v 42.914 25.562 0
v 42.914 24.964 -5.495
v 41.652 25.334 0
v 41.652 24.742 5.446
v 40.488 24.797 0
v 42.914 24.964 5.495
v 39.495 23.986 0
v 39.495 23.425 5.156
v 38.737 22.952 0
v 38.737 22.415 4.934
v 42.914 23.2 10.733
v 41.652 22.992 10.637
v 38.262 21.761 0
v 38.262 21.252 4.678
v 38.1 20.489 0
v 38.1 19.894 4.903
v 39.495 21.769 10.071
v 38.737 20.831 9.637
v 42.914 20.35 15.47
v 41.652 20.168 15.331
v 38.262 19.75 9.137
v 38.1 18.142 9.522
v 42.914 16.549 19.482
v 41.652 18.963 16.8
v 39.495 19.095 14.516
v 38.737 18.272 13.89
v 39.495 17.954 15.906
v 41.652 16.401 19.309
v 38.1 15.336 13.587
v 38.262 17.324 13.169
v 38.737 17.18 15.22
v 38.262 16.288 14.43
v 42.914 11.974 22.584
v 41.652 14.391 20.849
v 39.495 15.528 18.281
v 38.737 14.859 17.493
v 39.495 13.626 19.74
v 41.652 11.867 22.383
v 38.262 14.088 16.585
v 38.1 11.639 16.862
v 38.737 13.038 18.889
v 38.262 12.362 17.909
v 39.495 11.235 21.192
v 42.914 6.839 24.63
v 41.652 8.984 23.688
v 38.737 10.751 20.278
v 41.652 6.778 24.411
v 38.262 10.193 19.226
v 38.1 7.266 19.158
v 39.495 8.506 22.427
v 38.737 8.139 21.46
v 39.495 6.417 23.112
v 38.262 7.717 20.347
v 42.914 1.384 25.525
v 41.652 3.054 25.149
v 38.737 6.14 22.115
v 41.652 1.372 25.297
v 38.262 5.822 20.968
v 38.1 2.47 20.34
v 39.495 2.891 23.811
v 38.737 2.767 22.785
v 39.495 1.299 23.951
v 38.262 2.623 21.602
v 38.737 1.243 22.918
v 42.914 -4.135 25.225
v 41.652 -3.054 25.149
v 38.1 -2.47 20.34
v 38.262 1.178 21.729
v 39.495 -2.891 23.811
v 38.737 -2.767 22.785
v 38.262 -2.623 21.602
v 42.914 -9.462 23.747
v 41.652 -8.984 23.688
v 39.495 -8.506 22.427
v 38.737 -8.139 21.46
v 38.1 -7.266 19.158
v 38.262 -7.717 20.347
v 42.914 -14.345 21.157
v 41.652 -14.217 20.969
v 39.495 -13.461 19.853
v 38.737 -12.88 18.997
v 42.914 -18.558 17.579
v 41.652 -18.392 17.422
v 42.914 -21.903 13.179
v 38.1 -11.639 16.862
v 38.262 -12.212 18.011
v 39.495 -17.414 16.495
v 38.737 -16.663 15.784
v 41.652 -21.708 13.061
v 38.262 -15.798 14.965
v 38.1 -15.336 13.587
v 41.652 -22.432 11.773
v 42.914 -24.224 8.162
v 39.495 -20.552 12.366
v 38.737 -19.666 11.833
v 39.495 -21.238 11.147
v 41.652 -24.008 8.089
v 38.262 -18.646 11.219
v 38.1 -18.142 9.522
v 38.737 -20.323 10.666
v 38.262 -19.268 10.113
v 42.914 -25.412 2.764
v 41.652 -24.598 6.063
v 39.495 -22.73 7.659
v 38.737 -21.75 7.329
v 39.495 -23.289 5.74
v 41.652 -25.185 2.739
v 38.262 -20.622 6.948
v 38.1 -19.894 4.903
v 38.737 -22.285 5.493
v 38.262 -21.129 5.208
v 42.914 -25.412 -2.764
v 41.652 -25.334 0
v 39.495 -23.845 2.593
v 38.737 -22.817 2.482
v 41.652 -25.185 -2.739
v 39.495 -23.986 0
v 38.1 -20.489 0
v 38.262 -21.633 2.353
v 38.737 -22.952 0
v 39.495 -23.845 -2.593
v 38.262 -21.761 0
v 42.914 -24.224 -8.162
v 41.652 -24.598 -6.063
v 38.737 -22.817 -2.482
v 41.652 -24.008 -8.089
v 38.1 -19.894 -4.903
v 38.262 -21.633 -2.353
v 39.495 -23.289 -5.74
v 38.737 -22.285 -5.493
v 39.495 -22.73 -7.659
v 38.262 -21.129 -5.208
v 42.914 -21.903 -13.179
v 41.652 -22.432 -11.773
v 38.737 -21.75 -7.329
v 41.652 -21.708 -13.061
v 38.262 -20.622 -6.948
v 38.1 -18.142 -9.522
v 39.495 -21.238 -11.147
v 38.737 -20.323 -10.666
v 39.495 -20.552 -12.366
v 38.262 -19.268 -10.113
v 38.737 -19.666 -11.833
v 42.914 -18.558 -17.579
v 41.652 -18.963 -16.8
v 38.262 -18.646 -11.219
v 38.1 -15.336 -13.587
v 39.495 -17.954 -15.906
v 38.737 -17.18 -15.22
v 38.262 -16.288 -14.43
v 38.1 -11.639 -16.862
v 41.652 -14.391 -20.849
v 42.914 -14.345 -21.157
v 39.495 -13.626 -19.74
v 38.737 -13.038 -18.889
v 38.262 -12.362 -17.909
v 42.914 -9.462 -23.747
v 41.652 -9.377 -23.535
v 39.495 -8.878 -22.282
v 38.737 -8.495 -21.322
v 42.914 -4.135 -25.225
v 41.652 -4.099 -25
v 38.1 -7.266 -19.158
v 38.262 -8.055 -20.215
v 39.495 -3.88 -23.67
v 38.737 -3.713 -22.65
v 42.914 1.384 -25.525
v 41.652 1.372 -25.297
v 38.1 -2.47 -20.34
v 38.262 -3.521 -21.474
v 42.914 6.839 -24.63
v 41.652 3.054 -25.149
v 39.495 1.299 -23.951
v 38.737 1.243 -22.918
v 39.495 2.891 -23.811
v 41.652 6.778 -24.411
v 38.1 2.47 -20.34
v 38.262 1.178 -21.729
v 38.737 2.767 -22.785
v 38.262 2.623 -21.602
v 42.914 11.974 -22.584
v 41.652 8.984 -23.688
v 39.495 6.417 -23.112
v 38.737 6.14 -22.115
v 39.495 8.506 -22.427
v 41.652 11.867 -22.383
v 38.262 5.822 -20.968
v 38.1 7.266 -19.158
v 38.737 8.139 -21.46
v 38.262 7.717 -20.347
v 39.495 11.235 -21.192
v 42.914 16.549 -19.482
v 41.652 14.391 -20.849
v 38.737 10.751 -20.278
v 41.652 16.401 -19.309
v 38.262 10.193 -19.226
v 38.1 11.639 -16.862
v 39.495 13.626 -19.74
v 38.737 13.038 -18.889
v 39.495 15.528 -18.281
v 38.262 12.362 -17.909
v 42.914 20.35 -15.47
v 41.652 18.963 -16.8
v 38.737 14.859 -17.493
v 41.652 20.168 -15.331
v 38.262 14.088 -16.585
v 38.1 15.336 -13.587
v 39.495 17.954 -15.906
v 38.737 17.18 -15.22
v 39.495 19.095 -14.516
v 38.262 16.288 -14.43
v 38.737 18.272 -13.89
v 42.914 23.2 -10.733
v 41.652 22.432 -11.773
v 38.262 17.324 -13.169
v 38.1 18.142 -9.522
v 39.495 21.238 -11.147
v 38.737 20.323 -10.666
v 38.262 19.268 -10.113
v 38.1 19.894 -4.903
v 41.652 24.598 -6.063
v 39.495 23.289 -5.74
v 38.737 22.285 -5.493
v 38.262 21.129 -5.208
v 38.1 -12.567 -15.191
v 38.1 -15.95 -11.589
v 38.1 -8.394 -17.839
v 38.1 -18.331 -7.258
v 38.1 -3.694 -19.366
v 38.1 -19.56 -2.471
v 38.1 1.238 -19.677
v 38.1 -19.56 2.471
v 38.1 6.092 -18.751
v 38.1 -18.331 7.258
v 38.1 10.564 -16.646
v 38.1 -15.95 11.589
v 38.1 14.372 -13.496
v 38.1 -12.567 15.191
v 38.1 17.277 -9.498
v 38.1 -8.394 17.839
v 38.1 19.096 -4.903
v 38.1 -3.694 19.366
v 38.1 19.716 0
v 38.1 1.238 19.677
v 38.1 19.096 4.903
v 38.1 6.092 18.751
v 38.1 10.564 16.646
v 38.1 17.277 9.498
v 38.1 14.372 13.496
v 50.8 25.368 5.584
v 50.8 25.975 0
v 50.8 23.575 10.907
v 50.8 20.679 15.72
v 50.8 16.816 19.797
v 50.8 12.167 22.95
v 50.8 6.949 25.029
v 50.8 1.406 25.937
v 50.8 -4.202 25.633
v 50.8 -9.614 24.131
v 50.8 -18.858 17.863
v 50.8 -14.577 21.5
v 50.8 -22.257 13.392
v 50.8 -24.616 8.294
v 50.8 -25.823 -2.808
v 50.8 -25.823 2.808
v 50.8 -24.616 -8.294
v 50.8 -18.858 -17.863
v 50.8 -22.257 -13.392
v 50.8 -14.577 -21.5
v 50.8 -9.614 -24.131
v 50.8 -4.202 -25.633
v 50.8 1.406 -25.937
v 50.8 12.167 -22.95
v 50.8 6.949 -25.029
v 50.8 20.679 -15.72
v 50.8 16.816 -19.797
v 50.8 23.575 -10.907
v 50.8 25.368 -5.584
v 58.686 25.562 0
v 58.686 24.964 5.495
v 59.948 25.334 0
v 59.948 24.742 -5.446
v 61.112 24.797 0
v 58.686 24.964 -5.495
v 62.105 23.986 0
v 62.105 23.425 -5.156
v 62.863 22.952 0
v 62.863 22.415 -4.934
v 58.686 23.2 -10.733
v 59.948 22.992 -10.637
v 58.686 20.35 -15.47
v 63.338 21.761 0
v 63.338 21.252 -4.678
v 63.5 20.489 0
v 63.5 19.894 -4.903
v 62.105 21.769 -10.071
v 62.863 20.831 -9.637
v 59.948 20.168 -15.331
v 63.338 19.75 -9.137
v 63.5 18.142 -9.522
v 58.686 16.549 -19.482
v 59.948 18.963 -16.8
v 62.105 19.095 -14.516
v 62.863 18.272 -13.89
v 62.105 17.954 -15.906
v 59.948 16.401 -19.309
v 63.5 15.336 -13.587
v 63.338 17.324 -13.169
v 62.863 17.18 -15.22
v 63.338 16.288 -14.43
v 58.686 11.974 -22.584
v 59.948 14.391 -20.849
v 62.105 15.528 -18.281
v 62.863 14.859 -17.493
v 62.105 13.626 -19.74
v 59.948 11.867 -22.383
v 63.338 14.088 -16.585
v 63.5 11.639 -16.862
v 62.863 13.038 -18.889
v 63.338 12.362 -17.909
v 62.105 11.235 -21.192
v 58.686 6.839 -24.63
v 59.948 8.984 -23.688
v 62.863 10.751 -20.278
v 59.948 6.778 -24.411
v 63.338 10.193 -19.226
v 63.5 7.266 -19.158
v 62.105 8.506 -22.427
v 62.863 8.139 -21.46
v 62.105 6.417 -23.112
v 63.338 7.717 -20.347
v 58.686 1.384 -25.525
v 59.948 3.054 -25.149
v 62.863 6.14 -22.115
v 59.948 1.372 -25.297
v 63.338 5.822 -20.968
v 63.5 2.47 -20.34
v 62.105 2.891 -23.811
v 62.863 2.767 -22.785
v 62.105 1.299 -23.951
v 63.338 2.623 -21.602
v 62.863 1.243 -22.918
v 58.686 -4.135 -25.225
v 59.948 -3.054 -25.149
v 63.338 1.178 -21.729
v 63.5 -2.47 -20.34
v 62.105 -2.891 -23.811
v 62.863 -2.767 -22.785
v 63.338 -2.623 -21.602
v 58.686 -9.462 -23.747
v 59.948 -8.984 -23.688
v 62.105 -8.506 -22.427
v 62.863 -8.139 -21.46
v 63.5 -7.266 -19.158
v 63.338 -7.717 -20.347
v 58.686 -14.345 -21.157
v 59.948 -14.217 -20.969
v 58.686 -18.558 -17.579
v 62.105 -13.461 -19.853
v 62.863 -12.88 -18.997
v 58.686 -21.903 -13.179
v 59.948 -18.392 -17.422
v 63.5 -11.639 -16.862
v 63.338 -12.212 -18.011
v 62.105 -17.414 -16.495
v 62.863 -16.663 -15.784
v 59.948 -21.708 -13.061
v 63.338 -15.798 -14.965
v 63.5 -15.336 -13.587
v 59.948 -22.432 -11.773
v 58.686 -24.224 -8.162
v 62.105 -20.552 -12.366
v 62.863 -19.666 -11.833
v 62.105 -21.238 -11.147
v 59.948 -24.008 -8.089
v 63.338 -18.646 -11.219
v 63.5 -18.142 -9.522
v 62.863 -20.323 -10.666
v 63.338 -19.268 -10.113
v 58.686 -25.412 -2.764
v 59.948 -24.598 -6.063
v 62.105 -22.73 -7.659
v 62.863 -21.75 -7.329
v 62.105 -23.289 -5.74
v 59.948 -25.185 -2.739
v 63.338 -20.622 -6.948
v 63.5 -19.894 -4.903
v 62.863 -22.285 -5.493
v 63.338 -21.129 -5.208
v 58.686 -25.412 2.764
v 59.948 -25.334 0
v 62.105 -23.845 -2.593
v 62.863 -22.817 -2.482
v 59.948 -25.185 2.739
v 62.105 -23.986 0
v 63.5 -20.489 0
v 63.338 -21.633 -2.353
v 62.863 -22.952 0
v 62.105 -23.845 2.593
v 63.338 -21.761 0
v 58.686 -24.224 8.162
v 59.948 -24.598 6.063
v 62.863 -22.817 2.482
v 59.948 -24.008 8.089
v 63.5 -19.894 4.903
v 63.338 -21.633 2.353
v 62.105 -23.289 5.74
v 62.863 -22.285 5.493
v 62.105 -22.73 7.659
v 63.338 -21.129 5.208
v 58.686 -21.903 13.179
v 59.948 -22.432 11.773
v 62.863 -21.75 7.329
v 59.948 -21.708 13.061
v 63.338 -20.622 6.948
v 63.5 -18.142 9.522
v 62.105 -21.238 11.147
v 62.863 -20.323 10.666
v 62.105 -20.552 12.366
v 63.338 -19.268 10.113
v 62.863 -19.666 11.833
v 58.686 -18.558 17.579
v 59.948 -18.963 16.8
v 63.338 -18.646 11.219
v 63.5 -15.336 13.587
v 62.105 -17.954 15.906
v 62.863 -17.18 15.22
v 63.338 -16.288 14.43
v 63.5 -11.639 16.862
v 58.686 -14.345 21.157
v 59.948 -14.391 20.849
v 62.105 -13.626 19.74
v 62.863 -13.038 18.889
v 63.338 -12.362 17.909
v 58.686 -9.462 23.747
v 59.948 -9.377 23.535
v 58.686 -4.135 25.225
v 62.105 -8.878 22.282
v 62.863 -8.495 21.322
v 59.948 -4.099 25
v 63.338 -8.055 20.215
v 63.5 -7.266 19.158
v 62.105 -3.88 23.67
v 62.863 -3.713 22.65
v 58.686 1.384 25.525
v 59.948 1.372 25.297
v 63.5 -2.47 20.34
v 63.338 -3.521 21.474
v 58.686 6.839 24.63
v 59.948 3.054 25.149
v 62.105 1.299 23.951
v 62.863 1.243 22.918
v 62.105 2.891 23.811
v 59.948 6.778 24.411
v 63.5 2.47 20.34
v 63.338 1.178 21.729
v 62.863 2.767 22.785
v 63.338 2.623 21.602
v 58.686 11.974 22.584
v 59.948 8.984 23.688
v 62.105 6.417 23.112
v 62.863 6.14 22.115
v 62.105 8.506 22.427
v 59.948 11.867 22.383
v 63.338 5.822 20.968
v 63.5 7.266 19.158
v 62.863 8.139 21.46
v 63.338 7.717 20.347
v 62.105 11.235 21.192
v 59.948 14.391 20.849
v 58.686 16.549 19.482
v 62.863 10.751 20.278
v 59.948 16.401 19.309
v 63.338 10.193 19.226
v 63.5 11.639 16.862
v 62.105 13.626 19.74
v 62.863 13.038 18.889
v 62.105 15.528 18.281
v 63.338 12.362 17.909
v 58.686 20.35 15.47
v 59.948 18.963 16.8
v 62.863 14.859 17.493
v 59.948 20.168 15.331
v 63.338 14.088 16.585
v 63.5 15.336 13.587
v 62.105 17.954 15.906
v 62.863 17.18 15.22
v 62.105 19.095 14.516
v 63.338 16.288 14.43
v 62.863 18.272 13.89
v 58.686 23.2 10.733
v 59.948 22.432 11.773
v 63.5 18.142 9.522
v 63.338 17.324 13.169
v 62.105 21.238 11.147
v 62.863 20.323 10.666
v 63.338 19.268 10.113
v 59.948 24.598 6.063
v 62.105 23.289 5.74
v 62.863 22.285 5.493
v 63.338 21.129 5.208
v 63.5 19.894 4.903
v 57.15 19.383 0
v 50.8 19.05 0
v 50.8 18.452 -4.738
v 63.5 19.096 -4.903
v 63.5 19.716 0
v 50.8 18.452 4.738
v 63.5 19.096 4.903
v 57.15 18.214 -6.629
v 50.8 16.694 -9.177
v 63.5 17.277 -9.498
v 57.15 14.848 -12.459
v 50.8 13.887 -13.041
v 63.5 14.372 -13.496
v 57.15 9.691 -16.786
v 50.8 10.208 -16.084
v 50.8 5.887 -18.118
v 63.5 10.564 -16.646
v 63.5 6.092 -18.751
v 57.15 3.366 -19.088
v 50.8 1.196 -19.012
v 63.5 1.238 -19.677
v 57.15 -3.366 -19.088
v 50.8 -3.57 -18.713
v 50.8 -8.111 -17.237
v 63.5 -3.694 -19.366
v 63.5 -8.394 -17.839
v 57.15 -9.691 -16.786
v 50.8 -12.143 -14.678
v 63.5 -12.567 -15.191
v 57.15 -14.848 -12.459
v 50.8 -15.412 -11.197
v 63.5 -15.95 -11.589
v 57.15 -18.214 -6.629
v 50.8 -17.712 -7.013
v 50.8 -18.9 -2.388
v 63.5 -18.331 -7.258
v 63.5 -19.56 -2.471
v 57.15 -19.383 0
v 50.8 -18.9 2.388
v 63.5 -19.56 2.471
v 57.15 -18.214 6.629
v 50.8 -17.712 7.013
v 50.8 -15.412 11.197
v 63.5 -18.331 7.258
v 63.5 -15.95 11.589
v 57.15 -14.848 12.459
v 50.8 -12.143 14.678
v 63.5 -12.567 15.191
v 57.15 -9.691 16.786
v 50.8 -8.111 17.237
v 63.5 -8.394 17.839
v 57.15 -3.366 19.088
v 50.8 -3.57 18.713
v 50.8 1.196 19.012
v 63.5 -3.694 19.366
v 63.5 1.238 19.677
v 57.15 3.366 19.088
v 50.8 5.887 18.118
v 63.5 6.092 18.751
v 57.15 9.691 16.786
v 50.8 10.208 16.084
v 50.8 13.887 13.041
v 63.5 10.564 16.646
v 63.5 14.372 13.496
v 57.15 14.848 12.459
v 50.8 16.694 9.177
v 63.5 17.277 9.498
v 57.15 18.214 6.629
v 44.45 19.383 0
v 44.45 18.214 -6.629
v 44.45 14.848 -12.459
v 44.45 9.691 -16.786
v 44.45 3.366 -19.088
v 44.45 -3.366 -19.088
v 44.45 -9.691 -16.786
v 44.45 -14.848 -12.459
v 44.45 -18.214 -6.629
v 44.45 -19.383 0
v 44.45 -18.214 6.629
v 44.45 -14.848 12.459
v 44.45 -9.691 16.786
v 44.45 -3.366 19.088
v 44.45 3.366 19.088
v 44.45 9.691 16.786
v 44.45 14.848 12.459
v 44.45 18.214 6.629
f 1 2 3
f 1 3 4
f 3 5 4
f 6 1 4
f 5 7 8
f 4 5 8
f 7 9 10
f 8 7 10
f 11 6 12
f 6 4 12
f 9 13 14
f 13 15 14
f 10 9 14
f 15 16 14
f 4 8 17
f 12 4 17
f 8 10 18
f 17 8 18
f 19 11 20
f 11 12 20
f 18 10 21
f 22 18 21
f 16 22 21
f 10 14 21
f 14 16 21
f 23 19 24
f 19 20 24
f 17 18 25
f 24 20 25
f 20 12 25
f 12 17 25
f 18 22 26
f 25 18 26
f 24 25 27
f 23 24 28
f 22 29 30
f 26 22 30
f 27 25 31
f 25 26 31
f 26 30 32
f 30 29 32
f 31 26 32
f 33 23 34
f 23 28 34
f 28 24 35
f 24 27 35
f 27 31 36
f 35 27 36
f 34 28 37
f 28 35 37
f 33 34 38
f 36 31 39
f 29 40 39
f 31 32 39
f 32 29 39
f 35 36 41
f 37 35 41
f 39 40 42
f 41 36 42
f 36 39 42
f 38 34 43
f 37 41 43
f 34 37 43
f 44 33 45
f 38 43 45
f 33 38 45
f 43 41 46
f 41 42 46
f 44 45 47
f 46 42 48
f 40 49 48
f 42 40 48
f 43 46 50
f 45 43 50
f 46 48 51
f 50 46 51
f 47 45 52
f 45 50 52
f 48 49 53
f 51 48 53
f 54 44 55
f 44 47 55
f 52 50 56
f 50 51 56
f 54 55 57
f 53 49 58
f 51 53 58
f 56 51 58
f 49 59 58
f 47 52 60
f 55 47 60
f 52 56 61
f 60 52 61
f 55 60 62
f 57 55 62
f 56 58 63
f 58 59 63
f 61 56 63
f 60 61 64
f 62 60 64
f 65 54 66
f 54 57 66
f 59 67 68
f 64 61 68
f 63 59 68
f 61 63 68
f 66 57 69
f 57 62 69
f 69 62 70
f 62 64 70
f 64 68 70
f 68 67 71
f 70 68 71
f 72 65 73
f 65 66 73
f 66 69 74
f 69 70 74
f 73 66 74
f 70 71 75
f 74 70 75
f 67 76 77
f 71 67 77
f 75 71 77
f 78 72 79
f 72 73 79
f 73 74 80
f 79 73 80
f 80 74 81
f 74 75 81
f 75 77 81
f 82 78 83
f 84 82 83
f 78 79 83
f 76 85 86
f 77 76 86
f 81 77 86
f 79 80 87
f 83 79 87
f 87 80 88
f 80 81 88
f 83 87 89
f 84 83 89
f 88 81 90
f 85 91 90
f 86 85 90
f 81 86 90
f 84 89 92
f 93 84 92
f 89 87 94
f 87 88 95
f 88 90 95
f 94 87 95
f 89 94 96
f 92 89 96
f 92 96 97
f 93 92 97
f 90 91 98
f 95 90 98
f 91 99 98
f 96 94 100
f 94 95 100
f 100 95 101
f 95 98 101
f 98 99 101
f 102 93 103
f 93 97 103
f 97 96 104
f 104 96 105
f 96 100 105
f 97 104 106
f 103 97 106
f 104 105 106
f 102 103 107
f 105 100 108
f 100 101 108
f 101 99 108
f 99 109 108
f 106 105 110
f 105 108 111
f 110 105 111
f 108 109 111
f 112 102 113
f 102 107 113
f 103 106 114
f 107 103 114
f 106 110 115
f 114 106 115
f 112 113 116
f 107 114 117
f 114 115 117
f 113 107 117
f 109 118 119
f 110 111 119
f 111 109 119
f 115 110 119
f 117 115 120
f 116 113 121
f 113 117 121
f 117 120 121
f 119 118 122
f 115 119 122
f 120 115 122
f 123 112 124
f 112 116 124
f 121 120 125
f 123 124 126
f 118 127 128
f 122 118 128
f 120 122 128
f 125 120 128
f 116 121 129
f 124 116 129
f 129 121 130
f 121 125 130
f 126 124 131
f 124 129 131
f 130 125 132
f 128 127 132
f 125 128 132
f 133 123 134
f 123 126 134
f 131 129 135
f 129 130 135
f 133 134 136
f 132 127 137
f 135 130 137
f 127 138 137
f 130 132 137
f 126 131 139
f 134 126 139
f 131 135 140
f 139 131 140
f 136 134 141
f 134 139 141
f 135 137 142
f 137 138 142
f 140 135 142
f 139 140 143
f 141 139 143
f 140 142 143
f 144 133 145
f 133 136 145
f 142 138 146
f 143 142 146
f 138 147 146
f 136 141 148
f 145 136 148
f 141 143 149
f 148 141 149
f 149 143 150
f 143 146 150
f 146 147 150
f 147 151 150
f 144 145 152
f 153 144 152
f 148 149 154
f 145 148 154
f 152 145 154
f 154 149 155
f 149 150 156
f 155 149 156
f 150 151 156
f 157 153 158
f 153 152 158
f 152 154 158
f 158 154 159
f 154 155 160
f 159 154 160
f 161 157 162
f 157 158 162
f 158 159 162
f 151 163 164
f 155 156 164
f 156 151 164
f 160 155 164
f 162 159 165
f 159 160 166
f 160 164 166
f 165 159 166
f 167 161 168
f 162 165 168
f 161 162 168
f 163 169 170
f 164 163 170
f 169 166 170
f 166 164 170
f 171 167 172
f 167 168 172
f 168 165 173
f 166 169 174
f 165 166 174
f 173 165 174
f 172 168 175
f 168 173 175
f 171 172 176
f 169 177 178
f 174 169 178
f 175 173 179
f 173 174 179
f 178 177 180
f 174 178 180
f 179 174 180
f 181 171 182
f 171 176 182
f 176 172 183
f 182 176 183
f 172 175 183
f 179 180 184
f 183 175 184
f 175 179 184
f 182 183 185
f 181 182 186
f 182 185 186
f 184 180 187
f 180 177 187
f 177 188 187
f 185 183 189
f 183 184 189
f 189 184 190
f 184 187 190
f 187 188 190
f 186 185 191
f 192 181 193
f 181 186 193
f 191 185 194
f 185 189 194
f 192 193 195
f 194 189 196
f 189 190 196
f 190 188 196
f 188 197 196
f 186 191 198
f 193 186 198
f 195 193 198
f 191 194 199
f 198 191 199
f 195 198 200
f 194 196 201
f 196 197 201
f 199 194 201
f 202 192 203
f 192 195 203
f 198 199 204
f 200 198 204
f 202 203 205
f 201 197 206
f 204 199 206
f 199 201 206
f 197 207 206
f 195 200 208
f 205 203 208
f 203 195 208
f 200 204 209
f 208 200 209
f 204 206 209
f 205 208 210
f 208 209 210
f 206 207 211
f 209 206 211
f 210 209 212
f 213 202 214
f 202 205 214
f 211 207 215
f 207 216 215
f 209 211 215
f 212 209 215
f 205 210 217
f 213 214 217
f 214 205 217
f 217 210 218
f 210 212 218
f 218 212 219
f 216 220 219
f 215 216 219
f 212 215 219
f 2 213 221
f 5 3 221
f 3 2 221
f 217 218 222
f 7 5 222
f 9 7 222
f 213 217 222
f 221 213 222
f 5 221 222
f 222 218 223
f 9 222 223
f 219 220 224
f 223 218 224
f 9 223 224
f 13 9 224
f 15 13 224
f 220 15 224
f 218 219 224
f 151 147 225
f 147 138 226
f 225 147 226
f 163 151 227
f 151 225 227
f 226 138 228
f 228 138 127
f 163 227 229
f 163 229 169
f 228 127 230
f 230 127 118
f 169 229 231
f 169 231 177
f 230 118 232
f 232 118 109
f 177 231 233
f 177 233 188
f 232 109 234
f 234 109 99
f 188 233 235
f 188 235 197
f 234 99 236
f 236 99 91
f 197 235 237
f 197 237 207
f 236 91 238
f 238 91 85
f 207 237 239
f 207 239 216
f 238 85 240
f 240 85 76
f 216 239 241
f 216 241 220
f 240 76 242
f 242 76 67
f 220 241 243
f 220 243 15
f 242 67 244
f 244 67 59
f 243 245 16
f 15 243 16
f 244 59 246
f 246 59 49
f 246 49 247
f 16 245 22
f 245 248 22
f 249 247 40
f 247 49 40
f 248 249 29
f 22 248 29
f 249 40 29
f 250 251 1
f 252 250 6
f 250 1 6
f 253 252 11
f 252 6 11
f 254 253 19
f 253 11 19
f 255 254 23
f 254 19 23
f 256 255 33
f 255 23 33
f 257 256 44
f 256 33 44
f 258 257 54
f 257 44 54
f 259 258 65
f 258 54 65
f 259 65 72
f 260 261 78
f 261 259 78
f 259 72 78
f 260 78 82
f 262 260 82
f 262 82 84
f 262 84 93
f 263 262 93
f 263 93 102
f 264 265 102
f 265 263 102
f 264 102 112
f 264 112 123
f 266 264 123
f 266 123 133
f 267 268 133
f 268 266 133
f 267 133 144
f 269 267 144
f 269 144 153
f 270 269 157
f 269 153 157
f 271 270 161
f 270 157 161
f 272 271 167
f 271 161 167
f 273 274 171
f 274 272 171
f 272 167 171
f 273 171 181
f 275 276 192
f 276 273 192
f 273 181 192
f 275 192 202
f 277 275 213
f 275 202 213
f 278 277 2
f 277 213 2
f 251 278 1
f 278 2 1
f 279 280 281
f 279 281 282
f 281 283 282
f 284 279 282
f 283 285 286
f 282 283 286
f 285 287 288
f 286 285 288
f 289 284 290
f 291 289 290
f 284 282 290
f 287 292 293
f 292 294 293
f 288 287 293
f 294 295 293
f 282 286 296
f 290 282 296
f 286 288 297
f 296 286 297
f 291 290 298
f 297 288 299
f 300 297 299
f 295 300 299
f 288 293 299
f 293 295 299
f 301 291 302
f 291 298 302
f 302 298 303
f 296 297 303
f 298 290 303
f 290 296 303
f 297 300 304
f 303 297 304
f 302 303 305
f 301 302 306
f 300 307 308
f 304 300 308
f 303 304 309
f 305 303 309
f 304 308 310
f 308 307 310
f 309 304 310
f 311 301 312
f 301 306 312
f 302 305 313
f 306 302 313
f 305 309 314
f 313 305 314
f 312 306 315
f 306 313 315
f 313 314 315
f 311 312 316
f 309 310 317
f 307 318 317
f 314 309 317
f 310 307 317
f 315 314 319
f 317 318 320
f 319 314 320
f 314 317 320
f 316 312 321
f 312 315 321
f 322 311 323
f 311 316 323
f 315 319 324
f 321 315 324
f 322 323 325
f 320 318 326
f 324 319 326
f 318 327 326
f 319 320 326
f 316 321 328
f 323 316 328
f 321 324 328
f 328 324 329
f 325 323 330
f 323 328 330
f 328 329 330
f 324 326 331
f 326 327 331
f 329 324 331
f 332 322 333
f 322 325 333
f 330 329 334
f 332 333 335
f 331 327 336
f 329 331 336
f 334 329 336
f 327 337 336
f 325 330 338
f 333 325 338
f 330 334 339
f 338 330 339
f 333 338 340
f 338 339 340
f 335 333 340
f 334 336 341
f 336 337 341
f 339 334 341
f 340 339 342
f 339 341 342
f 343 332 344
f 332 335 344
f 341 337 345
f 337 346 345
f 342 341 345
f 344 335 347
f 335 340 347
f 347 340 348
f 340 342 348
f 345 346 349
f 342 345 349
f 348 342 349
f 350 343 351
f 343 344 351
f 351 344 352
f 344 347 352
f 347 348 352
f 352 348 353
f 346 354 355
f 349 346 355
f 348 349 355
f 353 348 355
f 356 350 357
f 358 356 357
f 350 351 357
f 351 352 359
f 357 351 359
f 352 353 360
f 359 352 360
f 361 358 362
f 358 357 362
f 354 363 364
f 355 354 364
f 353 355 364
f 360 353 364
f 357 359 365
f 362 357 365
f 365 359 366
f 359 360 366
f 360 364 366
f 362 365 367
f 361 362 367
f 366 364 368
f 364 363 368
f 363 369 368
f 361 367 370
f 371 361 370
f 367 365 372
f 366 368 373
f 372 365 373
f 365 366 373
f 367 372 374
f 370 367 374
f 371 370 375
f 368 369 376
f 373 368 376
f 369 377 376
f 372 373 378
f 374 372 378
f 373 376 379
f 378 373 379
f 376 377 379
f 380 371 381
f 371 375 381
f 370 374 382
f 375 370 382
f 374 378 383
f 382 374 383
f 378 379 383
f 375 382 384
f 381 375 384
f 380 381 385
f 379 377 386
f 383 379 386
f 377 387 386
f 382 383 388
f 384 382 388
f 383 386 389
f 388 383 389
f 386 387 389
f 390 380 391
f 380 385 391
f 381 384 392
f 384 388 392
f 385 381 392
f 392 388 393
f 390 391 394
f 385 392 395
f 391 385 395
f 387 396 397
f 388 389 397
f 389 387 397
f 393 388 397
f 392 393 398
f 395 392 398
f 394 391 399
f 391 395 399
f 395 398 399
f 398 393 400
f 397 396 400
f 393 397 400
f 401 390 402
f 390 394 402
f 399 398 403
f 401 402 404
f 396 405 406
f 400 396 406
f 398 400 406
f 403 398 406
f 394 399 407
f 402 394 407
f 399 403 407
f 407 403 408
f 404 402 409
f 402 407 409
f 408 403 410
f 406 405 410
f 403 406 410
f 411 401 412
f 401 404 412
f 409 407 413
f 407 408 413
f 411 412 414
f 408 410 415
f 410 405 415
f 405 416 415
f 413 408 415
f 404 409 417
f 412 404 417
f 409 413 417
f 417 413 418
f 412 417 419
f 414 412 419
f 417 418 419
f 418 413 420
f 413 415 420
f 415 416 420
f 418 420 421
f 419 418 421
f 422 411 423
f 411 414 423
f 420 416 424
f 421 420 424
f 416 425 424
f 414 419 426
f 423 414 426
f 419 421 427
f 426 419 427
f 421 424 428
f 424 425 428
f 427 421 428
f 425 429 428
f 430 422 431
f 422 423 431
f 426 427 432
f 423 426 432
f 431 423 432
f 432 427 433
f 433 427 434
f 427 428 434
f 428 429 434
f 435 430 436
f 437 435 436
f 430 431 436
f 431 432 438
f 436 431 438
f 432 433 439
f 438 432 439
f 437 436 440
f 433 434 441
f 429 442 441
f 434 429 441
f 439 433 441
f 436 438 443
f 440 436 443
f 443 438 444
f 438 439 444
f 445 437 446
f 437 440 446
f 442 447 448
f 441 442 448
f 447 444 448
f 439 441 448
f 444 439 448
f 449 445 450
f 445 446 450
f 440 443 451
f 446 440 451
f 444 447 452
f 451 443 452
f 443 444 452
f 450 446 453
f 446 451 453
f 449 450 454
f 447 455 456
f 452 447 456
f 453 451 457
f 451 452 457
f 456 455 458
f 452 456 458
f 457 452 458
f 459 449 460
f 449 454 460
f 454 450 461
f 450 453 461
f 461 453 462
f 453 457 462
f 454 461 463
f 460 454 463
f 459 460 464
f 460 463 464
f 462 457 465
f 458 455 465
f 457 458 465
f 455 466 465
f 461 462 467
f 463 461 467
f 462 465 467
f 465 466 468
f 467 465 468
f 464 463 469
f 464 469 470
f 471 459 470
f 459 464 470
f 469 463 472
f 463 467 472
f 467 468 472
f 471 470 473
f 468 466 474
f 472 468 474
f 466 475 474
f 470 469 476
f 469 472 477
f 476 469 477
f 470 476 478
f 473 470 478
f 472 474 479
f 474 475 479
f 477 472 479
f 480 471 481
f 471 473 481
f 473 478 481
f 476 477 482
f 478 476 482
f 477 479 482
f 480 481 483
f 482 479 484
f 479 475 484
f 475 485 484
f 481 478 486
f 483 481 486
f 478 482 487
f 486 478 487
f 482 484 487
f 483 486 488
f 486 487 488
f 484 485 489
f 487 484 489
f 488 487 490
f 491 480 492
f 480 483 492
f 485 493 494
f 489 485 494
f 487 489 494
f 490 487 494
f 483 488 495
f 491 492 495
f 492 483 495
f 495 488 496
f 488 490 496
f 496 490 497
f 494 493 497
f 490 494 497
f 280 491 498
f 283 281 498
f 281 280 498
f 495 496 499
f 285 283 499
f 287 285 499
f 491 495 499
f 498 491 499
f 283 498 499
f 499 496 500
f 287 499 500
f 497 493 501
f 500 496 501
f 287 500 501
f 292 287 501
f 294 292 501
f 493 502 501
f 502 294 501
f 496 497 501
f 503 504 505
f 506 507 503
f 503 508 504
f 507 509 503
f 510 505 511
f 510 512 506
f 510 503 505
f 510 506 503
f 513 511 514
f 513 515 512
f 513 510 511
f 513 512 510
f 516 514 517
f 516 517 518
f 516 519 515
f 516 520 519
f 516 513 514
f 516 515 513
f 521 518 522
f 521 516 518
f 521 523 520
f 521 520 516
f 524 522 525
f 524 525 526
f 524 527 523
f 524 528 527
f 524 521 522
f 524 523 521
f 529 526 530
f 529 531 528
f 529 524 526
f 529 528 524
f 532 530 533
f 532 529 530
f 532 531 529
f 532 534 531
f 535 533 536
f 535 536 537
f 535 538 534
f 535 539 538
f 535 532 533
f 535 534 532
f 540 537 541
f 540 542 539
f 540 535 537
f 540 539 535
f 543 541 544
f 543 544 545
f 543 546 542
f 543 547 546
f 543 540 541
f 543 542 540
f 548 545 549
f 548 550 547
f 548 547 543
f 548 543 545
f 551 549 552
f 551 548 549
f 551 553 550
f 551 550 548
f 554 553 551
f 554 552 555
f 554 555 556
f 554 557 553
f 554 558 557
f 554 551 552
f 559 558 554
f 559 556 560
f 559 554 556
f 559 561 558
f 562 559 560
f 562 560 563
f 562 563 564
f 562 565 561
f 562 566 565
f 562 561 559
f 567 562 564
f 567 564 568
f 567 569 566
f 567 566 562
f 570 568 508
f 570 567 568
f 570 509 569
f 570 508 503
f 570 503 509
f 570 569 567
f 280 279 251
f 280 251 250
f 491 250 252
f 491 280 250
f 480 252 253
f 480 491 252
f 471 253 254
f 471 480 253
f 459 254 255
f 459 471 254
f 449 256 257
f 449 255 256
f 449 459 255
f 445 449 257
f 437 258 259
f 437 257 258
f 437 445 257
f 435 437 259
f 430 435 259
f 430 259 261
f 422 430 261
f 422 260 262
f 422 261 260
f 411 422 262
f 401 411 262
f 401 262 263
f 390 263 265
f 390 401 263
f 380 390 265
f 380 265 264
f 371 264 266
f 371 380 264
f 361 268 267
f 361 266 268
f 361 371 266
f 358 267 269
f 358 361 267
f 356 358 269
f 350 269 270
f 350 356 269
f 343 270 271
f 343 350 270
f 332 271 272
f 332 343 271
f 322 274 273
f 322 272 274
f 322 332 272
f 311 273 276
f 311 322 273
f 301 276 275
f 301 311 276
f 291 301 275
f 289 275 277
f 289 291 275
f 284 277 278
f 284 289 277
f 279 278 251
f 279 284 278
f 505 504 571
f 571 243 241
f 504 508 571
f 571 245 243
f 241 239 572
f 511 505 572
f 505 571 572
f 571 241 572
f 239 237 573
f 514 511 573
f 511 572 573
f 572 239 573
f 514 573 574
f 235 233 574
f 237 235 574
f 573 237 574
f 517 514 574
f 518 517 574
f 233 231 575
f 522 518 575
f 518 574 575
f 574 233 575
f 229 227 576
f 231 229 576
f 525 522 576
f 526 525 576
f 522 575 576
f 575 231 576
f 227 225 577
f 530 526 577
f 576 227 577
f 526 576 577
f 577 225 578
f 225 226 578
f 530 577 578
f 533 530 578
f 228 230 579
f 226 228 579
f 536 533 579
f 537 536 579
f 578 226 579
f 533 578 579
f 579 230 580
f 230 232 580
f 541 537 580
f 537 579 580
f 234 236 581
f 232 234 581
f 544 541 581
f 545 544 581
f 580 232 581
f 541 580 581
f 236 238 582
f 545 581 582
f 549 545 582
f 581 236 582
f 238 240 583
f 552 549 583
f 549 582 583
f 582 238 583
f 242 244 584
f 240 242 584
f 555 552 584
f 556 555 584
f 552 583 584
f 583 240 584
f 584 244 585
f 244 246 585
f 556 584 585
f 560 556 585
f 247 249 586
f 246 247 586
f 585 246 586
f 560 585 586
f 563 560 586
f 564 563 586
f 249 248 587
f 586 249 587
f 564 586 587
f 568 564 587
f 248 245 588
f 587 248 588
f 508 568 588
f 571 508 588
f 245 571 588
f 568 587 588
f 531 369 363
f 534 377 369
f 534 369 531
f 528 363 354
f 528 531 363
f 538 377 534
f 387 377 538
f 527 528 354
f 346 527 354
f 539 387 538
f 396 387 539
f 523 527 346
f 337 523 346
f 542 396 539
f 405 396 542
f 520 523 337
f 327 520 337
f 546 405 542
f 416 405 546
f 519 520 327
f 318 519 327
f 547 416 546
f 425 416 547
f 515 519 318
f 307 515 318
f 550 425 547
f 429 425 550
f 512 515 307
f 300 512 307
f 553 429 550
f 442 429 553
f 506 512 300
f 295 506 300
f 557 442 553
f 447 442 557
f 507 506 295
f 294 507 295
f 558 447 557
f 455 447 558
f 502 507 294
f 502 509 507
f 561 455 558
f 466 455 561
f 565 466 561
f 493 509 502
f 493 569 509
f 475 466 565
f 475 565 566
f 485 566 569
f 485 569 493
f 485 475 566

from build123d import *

# Parameters (mm, degrees)
F2_R     = 25.9753807736
F2_R_2   = 19.05
F3_DEPTH = 12.7
F3_TAPER = 3
F4_R     = 5.08


# Not quite as in the source:
# - two fillets or chamfers of one size are made in one step


with BuildPart() as f3:
    # F2 (on offset) → F3 (new body, symmetric)
    with BuildSketch(Plane.YZ.offset(50.8)):
        Circle(F2_R)
        Circle(F2_R_2, mode=Mode.SUBTRACT)
    extrude(amount=F3_DEPTH, both=True, taper=F3_TAPER)

    # F4
    f4_edges = [f3.edges().sort_by_distance(p)[0] for p in [
        (63.5, -25.309802, 0),
        (38.1, -25.309802, 0),
    ]]
    fillet(f4_edges, radius=F4_R)


solid = f3.part
